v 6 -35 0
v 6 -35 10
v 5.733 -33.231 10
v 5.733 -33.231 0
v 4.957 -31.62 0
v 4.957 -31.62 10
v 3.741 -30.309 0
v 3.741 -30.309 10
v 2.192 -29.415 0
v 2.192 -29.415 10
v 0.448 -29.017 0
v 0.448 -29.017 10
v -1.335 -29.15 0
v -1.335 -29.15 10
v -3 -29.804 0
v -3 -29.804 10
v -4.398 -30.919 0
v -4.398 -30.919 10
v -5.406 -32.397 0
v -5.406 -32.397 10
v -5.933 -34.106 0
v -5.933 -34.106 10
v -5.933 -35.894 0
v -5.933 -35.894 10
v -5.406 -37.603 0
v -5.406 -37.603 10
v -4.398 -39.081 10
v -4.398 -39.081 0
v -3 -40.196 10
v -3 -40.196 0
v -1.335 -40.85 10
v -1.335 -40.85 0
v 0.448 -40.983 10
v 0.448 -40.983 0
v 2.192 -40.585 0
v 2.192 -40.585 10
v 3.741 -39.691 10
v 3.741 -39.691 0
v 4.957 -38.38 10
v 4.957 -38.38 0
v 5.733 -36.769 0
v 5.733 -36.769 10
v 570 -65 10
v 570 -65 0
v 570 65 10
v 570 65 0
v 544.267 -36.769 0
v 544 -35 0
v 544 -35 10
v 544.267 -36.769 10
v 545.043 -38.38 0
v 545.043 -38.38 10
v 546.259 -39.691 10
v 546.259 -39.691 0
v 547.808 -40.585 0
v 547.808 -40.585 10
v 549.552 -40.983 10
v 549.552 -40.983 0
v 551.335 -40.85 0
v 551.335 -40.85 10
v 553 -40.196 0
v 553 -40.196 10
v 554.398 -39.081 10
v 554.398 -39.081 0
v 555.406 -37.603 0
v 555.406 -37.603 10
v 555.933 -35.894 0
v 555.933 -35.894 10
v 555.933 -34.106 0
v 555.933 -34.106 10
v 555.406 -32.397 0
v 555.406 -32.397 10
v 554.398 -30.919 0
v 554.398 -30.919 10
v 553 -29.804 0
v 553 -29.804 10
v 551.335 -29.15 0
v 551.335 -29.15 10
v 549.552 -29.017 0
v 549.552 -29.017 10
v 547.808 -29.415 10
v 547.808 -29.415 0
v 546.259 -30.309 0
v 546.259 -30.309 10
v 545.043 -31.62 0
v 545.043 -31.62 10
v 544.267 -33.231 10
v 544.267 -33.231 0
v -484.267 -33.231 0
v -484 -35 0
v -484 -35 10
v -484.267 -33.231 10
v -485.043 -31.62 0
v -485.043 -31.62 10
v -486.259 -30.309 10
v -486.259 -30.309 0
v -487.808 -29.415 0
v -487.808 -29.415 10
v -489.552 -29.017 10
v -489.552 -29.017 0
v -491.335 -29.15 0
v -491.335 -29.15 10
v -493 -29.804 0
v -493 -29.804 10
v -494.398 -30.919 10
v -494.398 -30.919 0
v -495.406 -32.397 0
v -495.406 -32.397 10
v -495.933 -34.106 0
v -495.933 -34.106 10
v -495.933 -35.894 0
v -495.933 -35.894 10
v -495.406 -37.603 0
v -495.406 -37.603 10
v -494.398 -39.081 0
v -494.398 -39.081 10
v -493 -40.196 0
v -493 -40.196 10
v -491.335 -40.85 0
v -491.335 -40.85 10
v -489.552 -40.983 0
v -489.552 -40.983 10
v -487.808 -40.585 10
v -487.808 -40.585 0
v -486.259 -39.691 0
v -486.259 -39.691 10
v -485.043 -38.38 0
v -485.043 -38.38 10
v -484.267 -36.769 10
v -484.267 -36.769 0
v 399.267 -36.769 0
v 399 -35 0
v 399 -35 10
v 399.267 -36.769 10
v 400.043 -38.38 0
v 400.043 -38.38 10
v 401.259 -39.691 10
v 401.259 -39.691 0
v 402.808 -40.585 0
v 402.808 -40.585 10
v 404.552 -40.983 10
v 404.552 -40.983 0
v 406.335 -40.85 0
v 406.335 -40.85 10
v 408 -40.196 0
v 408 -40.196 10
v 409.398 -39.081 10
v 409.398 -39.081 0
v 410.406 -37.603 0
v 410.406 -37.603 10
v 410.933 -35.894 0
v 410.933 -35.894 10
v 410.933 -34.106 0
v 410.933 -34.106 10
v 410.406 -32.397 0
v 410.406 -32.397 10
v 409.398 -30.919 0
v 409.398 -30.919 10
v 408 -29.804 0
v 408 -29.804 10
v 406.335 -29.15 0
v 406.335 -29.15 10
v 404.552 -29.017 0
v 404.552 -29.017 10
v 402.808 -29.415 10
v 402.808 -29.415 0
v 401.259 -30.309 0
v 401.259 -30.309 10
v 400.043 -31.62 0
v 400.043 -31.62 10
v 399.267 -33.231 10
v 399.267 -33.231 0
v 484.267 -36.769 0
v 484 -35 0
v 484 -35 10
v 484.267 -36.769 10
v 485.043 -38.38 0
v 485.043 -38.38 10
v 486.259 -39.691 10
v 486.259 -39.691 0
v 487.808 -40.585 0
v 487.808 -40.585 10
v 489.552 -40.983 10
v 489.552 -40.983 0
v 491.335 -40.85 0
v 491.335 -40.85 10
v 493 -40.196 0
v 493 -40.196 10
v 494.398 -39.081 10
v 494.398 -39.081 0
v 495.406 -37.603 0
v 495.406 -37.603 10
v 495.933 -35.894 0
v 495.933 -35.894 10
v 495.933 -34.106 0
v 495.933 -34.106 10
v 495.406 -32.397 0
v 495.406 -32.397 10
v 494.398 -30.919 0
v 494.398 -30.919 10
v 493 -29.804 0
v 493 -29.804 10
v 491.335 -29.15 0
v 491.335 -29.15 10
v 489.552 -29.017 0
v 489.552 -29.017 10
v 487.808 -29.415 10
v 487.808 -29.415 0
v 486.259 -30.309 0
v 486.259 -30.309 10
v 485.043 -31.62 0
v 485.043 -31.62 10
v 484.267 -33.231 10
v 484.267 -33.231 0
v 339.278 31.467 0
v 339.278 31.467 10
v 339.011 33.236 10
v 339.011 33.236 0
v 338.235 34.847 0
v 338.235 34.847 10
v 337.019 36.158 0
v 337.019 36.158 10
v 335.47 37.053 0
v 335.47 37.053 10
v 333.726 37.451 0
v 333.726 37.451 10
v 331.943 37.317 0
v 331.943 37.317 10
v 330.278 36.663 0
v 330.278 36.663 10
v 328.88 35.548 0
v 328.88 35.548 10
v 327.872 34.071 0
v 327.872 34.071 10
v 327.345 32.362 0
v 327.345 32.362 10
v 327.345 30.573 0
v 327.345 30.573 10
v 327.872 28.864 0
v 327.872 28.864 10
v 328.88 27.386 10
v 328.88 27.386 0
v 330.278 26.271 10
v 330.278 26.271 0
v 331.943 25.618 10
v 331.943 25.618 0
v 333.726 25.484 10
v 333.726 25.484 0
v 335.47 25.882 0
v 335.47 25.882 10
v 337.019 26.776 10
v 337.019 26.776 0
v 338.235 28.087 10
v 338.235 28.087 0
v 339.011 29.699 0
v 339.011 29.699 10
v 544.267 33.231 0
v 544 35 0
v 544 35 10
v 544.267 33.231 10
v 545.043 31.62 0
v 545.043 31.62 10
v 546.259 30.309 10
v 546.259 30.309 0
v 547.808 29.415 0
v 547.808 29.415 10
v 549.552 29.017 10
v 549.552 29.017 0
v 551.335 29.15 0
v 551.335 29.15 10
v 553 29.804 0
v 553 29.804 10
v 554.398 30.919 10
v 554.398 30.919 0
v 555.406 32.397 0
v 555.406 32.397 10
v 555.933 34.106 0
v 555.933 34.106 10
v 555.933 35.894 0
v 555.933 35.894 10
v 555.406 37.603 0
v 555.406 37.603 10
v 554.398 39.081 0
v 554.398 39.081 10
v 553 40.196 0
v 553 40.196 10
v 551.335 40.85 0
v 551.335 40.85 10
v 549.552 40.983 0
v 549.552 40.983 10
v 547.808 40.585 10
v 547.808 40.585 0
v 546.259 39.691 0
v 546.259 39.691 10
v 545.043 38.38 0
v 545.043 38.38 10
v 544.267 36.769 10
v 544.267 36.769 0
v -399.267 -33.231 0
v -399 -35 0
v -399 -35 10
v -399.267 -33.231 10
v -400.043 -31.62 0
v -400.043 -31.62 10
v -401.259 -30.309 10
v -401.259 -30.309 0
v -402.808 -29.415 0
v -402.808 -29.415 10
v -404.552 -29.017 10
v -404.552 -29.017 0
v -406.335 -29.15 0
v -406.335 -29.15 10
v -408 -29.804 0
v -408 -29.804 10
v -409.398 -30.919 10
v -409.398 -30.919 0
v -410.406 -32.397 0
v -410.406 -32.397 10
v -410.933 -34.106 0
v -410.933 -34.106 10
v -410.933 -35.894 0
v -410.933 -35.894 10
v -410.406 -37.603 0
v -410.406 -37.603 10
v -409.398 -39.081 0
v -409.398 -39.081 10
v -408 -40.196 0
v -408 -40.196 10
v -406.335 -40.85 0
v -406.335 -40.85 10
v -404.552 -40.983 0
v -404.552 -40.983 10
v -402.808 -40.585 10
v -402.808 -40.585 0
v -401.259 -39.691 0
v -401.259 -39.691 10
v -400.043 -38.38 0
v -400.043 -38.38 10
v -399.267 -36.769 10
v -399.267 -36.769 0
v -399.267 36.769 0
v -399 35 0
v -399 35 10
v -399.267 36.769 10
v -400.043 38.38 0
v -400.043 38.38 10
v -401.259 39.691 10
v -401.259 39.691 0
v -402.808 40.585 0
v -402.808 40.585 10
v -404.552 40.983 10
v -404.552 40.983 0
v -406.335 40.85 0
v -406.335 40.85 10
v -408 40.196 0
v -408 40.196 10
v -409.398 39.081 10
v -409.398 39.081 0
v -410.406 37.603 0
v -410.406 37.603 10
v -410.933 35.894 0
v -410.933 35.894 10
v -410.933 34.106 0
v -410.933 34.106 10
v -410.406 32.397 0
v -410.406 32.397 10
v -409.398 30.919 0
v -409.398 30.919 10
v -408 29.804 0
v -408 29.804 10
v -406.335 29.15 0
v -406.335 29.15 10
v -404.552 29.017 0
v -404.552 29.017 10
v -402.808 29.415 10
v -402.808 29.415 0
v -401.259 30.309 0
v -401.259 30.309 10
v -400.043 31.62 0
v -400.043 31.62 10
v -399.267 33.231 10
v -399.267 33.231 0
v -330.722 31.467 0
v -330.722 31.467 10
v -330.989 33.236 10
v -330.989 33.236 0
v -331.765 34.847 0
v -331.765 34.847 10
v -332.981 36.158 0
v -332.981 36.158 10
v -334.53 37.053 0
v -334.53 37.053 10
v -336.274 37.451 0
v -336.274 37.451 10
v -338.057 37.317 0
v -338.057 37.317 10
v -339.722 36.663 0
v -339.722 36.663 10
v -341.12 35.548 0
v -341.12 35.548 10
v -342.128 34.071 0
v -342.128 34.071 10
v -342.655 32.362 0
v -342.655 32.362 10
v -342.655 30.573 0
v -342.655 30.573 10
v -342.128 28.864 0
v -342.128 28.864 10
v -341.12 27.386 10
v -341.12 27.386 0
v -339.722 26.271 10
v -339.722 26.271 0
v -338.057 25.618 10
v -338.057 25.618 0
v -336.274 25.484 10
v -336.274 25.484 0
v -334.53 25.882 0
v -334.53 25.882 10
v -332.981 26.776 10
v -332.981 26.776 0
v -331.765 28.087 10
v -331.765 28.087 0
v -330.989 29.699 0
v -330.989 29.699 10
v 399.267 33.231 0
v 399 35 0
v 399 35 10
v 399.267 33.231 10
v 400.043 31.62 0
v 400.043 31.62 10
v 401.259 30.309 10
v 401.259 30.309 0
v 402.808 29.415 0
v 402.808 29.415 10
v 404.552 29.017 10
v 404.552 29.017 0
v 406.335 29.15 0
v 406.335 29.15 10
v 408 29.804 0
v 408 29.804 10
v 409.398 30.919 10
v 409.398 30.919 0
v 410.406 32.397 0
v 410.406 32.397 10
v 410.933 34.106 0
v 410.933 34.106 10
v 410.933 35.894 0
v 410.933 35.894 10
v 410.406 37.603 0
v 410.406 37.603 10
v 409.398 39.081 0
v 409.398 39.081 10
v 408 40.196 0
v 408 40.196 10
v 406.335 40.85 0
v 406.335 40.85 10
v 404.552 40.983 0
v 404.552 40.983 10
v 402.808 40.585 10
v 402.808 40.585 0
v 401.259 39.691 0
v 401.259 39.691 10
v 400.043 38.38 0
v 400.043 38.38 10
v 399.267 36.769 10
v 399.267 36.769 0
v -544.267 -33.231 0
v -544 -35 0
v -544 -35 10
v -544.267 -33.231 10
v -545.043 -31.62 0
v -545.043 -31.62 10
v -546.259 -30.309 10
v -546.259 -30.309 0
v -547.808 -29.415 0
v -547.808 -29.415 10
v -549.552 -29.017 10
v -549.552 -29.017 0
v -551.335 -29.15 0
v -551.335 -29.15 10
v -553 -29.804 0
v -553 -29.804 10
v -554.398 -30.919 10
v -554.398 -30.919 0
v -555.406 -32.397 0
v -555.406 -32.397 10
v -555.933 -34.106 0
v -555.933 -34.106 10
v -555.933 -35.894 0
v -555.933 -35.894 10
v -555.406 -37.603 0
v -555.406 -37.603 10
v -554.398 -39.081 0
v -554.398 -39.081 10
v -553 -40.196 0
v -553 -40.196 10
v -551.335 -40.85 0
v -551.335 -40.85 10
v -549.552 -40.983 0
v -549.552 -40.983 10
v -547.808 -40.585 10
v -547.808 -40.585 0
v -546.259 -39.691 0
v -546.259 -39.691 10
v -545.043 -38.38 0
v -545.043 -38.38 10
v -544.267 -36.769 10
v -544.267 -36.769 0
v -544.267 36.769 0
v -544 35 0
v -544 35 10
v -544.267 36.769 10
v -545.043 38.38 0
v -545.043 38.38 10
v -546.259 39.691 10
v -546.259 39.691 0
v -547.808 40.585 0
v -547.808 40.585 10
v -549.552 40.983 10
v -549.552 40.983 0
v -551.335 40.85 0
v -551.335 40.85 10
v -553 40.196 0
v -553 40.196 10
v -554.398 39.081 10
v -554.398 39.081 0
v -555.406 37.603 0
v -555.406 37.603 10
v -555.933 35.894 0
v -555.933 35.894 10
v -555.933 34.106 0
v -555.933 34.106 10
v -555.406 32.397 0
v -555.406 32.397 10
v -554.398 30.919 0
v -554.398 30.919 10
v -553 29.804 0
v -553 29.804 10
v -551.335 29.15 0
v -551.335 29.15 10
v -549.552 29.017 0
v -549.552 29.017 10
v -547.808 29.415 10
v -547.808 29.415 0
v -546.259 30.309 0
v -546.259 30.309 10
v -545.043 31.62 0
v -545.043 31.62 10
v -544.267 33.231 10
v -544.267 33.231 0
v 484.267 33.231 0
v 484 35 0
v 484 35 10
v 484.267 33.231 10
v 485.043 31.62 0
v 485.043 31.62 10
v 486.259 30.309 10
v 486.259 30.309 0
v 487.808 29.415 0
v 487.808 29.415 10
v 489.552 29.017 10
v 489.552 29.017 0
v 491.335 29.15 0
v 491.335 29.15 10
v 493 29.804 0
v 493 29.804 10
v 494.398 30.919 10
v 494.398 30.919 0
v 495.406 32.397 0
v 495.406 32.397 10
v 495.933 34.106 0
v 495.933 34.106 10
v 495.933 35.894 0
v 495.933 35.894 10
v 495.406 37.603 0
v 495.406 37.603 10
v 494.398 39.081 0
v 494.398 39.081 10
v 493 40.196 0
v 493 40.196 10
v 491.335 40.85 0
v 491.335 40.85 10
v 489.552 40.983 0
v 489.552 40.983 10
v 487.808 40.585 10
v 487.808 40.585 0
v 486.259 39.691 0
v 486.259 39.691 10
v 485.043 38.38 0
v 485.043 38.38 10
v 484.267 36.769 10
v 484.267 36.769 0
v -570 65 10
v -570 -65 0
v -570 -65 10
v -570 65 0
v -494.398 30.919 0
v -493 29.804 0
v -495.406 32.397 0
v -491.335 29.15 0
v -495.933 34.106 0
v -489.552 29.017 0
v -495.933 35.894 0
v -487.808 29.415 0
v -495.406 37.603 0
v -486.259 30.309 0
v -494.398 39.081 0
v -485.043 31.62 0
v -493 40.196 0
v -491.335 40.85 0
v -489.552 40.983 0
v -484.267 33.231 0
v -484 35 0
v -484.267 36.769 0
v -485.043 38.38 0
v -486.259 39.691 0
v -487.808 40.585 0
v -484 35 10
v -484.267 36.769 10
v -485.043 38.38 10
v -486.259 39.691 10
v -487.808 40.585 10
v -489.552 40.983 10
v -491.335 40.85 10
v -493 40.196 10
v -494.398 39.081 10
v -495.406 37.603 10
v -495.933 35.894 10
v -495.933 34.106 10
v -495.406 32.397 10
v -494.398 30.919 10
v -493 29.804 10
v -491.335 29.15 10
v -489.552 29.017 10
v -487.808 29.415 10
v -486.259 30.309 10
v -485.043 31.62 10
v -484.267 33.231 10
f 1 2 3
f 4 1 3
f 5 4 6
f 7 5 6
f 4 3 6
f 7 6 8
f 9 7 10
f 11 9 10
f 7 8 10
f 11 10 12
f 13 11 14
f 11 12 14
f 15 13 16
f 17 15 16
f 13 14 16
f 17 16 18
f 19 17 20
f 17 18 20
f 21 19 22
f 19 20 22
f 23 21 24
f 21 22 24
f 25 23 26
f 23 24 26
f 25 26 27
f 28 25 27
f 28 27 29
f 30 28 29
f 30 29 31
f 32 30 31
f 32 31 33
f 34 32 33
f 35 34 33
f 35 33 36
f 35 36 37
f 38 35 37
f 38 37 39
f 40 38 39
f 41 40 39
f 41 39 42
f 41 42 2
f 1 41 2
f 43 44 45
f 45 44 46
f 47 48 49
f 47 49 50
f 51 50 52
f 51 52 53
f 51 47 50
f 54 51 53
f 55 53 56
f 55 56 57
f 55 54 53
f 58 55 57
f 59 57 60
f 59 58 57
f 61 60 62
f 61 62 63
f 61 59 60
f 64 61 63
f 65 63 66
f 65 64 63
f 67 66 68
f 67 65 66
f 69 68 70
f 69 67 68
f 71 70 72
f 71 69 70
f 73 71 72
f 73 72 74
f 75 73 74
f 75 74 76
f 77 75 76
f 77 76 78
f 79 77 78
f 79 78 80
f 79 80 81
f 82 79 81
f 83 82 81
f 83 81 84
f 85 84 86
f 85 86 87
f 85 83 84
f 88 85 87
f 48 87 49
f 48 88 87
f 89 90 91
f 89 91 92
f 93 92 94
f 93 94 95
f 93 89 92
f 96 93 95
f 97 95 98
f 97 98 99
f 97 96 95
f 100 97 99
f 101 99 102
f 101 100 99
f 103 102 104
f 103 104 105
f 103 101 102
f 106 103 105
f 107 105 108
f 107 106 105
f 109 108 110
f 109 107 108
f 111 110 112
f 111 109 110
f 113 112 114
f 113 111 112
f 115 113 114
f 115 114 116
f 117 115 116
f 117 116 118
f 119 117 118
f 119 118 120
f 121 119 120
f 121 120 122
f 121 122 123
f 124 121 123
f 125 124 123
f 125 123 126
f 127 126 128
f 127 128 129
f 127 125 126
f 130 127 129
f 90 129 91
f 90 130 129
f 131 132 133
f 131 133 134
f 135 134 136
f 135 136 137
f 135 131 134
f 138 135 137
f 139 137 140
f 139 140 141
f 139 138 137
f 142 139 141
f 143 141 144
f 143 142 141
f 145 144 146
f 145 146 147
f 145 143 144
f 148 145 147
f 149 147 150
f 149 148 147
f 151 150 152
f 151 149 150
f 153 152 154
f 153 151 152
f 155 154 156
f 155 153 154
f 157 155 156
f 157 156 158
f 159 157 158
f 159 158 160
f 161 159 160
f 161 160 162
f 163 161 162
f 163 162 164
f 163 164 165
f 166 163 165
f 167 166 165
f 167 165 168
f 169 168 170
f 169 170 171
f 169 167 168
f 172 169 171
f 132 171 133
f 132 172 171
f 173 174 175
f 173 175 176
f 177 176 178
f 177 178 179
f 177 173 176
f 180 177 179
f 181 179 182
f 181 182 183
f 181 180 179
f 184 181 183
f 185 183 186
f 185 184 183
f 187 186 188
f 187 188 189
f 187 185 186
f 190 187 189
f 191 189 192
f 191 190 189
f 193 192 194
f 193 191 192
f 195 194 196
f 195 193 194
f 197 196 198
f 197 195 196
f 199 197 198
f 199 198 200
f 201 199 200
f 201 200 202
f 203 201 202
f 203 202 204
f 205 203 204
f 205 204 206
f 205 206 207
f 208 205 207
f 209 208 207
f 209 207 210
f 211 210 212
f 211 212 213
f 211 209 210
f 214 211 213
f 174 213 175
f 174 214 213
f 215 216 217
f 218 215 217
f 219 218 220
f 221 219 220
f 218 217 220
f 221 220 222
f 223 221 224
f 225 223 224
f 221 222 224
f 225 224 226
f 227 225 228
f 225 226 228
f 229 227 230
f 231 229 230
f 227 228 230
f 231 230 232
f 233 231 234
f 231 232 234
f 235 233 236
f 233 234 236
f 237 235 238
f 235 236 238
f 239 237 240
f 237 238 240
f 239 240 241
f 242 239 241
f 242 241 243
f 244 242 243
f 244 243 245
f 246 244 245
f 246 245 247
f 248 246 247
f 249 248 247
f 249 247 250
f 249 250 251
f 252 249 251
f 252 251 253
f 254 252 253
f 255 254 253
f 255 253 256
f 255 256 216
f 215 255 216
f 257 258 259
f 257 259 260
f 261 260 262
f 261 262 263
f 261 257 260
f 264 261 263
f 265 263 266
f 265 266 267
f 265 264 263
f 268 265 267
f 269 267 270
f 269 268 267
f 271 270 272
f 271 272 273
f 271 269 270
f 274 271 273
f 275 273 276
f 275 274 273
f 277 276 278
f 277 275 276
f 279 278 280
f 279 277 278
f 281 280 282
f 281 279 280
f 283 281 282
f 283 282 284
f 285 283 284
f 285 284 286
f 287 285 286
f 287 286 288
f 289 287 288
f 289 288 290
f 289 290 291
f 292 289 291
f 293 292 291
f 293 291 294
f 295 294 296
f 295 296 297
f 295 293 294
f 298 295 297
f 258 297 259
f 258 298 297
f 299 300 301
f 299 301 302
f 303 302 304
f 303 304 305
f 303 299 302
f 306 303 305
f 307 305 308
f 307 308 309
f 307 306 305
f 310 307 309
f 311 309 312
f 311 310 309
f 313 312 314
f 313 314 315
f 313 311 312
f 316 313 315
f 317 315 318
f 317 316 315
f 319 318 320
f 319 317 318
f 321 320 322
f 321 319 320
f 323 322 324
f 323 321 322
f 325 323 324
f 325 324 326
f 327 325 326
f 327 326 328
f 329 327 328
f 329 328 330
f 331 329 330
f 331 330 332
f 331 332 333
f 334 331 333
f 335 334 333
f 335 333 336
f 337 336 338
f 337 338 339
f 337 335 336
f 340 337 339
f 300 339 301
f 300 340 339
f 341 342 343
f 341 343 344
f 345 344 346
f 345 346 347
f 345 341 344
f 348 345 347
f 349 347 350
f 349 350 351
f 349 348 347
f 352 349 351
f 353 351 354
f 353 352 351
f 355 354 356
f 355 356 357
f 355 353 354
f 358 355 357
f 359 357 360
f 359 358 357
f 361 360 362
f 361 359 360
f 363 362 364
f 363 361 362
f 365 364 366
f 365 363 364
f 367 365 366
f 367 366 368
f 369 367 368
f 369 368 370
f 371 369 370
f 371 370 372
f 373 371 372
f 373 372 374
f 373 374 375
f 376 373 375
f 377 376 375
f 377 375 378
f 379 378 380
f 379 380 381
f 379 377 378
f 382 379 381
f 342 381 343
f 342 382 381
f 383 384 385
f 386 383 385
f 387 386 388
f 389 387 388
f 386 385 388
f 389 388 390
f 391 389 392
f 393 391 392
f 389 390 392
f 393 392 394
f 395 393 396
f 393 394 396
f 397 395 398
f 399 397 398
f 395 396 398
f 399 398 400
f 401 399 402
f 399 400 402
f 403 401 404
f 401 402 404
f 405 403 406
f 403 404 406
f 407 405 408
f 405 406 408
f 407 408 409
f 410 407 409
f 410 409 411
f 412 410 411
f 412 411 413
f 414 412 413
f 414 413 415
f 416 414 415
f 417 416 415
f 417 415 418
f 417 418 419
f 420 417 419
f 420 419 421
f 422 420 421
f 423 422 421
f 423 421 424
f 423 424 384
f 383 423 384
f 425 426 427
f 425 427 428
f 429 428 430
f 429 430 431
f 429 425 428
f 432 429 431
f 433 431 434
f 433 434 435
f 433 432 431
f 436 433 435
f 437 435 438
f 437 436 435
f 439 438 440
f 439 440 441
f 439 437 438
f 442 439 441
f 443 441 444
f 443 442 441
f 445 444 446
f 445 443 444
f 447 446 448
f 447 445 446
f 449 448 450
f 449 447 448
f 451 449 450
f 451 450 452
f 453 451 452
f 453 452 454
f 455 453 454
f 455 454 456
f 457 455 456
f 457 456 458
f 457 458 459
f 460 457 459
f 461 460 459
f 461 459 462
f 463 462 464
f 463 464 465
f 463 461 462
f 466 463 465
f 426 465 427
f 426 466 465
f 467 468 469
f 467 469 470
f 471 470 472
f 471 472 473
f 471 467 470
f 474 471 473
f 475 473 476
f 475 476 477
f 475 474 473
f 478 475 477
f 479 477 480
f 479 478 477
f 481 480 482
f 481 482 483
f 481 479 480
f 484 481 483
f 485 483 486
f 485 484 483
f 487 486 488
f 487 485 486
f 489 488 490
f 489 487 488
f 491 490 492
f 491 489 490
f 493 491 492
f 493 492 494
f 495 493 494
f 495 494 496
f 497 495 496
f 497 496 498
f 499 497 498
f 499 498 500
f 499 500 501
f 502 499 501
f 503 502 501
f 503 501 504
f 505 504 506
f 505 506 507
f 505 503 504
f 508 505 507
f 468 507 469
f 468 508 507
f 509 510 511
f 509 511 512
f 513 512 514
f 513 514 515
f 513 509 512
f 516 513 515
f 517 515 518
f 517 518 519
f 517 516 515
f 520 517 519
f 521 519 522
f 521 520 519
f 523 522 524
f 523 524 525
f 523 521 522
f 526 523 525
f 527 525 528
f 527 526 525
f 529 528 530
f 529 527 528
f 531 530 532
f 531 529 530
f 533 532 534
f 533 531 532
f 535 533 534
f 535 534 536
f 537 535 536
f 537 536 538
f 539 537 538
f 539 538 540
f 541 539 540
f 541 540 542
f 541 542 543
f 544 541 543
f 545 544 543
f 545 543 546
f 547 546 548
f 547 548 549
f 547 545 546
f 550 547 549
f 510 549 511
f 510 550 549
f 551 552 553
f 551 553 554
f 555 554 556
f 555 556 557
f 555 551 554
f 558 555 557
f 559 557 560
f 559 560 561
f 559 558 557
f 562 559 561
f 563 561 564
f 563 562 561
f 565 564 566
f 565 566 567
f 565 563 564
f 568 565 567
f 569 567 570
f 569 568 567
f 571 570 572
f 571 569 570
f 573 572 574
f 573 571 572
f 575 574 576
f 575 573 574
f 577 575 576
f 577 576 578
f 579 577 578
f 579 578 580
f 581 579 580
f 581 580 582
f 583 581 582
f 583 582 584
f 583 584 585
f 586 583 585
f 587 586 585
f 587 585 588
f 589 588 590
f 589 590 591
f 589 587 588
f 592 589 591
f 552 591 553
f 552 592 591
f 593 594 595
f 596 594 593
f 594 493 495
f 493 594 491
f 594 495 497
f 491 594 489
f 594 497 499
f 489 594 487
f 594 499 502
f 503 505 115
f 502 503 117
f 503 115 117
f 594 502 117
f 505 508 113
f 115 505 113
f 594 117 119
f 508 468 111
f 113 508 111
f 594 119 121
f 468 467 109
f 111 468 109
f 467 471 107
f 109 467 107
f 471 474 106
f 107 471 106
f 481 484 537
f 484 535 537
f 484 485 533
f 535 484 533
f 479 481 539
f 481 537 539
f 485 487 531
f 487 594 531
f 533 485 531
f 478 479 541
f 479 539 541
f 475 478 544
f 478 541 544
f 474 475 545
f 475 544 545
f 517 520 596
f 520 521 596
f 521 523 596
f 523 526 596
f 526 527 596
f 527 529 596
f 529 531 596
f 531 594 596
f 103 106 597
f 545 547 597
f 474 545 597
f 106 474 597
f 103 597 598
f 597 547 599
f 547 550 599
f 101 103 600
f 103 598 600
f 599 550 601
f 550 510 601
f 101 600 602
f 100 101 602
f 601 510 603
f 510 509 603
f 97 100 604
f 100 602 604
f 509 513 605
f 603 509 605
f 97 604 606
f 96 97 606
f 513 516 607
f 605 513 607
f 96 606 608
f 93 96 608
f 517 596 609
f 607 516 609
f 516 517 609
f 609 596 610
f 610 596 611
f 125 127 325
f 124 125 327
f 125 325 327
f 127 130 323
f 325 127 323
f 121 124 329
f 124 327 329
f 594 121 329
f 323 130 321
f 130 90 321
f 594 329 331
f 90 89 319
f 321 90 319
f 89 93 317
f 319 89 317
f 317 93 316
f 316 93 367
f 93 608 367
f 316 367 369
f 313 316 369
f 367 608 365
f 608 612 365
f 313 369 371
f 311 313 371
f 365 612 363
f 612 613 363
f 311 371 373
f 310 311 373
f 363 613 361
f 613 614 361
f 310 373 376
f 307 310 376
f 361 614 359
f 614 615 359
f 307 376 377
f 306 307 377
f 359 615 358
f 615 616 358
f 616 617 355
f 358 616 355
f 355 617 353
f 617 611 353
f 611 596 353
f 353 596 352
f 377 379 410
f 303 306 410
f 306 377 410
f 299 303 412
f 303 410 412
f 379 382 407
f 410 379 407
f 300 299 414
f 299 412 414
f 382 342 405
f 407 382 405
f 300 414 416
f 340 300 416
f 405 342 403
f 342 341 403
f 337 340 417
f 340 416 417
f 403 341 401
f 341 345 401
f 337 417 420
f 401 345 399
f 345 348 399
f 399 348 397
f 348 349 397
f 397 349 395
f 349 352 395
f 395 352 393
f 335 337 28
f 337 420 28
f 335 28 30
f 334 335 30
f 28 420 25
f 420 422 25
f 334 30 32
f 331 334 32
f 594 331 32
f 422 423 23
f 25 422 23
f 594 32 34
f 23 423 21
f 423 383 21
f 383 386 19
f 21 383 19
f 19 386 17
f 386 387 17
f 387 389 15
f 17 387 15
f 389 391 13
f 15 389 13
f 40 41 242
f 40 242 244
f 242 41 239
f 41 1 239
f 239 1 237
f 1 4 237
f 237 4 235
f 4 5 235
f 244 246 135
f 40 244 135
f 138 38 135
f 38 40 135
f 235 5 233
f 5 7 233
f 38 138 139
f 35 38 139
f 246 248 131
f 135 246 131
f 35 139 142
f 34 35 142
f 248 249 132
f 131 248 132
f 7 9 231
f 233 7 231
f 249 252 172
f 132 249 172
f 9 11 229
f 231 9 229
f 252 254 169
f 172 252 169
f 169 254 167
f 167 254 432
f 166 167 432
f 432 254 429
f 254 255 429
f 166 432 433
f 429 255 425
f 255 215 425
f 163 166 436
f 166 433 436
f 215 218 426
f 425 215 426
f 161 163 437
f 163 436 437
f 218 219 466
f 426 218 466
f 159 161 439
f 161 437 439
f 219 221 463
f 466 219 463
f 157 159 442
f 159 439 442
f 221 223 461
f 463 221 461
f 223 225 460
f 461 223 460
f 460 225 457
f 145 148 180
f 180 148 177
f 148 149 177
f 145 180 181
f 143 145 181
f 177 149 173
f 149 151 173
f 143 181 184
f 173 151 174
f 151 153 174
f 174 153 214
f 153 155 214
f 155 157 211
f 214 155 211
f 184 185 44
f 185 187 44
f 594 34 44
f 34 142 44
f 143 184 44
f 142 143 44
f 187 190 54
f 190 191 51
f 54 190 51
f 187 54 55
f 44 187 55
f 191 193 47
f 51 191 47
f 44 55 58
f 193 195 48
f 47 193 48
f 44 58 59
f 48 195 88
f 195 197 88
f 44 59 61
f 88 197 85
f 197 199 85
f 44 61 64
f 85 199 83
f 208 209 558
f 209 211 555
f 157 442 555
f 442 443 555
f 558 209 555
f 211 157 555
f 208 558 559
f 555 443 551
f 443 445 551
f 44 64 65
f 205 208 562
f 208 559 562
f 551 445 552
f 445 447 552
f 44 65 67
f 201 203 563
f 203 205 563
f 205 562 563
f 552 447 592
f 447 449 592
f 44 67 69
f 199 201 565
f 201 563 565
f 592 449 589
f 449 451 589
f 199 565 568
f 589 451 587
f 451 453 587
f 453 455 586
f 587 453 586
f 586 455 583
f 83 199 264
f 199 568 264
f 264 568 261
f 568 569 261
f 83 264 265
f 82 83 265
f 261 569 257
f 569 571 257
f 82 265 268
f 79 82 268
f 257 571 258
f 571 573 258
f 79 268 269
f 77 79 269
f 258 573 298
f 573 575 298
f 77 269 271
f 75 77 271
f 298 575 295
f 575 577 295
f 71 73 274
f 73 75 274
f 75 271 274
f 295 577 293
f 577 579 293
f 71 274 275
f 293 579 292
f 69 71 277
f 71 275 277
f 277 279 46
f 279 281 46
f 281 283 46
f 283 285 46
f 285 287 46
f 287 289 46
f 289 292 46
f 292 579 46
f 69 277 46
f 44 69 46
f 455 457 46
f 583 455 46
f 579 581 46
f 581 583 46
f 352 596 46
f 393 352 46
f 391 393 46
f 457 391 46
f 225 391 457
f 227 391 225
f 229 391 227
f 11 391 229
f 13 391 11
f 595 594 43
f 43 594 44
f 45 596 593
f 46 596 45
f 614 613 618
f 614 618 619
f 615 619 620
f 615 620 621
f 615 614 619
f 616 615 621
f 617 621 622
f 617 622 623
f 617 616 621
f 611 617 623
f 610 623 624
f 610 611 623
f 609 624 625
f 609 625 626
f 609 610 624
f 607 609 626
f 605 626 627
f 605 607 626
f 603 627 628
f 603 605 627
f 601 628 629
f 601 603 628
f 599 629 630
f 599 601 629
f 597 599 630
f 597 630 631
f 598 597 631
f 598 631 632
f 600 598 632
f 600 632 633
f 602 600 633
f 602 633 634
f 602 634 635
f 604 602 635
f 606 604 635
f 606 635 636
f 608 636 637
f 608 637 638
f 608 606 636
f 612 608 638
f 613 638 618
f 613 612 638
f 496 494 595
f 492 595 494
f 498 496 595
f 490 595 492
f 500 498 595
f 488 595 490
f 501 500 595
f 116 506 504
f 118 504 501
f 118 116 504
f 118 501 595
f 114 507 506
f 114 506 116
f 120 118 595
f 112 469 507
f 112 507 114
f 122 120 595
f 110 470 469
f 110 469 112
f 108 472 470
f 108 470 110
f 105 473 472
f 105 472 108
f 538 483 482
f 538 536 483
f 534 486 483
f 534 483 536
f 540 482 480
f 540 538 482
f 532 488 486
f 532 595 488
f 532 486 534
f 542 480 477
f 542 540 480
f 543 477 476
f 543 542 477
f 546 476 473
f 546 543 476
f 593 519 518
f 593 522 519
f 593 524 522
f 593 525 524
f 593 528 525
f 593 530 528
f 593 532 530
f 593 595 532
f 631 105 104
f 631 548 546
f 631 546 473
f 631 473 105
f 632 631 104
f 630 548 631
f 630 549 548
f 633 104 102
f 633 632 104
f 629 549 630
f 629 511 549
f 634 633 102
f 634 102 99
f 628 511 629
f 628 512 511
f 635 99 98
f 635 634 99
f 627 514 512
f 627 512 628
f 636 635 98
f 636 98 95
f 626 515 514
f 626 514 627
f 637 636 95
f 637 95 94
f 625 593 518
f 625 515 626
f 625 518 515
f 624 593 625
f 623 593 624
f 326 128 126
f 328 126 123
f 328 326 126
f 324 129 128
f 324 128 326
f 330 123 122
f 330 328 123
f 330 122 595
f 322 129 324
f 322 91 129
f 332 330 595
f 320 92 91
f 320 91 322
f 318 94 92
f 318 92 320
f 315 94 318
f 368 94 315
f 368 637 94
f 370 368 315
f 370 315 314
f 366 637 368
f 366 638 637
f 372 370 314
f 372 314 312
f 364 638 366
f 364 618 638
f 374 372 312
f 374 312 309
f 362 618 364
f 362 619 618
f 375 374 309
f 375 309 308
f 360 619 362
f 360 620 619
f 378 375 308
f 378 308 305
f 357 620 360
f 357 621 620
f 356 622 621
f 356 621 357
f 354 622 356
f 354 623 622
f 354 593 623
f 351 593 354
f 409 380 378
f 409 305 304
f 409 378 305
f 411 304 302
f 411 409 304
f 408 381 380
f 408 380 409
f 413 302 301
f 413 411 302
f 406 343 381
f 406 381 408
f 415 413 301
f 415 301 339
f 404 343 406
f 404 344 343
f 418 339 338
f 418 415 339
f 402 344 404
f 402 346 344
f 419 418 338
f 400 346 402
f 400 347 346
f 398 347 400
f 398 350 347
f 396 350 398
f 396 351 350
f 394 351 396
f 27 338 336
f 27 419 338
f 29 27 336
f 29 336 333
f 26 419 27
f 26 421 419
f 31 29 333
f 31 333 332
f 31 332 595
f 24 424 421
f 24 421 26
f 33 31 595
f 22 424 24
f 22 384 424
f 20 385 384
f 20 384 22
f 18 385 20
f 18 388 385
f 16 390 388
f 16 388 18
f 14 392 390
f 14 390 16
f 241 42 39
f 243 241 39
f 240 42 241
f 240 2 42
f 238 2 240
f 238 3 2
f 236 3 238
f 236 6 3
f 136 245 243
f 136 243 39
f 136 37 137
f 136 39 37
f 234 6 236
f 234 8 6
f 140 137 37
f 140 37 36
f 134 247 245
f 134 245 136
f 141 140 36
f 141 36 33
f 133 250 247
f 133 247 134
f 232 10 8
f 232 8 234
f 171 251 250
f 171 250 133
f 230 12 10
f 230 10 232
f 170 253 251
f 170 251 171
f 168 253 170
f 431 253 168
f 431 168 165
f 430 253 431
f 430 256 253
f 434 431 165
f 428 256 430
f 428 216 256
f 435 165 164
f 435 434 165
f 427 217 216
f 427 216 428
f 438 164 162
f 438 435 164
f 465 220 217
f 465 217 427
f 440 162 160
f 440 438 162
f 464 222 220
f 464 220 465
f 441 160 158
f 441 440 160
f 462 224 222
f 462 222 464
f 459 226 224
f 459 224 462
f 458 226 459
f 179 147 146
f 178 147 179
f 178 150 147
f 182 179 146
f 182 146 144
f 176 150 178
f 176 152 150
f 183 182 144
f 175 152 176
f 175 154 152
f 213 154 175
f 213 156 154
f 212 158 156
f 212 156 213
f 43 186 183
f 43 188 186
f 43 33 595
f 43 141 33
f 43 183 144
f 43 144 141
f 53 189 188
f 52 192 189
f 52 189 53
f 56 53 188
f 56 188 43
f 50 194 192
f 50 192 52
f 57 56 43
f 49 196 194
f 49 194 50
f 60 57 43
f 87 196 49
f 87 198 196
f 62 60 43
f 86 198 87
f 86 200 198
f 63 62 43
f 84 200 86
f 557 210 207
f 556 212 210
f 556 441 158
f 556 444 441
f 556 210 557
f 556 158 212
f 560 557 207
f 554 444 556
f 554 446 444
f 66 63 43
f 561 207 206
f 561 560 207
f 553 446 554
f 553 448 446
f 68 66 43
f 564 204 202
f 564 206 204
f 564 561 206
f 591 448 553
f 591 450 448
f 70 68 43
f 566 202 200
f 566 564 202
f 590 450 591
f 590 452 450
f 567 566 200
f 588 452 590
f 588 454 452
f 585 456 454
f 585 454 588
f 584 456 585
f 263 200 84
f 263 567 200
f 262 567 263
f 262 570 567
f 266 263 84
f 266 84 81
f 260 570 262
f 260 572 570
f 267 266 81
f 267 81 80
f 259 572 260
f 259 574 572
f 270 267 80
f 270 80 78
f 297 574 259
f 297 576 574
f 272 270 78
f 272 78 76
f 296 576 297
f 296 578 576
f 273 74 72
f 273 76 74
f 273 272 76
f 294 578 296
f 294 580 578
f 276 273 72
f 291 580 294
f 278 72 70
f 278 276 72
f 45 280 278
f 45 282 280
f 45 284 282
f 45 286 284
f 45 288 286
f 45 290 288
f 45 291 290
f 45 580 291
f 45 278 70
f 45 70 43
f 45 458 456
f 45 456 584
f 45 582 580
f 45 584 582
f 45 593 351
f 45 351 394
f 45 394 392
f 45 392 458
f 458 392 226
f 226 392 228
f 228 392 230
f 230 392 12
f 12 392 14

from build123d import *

# Parameters (mm, degrees)
SKETCH_1_W          = 1140
SKETCH_1_H          = 130
SKETCH_1_R          = 6
EXTRUDE_1_DEPTH     = 10
SKETCH_2_R          = 6
CUT_EXTRUDE_1_DEPTH = 574.781317228
SKETCH_3_R          = 6
CUT_EXTRUDE_2_DEPTH = 574.781317228
SKETCH_4_R          = 6
CUT_EXTRUDE_3_DEPTH = 574.781317228


with BuildPart() as part:
    # 草图1 → 凸台-拉伸1 (new body)
    with BuildSketch(Plane.XY):
        Rectangle(SKETCH_1_W, SKETCH_1_H)
        with Locations((-550, 35)):
            Circle(SKETCH_1_R, mode=Mode.SUBTRACT)
        with Locations((-490, 35)):
            Circle(SKETCH_1_R, mode=Mode.SUBTRACT)
        with Locations((-405, 35)):
            Circle(SKETCH_1_R, mode=Mode.SUBTRACT)
        with Locations((-550, -35)):
            Circle(SKETCH_1_R, mode=Mode.SUBTRACT)
        with Locations((-490, -35)):
            Circle(SKETCH_1_R, mode=Mode.SUBTRACT)
        with Locations((-405, -35)):
            Circle(SKETCH_1_R, mode=Mode.SUBTRACT)
        with Locations(Location((405, -35, 0), (0, 0, 180))):
            Circle(SKETCH_1_R, mode=Mode.SUBTRACT)
        with Locations(Location((490, -35, 0), (0, 0, 180))):
            Circle(SKETCH_1_R, mode=Mode.SUBTRACT)
        with Locations(Location((550, -35, 0), (0, 0, 180))):
            Circle(SKETCH_1_R, mode=Mode.SUBTRACT)
        with Locations(Location((405, 35, 0), (0, 0, 180))):
            Circle(SKETCH_1_R, mode=Mode.SUBTRACT)
        with Locations(Location((490, 35, 0), (0, 0, 180))):
            Circle(SKETCH_1_R, mode=Mode.SUBTRACT)
        with Locations(Location((550, 35, 0), (0, 0, 180))):
            Circle(SKETCH_1_R, mode=Mode.SUBTRACT)
    extrude(amount=EXTRUDE_1_DEPTH)

    # 草图2 → 切除-拉伸1 (cut, through all)
    with BuildSketch(Plane.XY.offset(10)):
        with Locations((0, -35)):
            Circle(SKETCH_2_R)
    extrude(amount=-CUT_EXTRUDE_1_DEPTH, mode=Mode.SUBTRACT)

    # 草图3 → 切除-拉伸2 (cut, through all)
    with BuildSketch(Plane.XY.offset(10)):
        with Locations((333.277993355, 31.467302422)):
            Circle(SKETCH_3_R)
    extrude(amount=-CUT_EXTRUDE_2_DEPTH, mode=Mode.SUBTRACT)

    # 草图4 → 切除-拉伸3 (cut, through all)
    with BuildSketch(Plane.XY.offset(10)):
        with Locations((-336.722006645, 31.467302422)):
            Circle(SKETCH_4_R)
    extrude(amount=-CUT_EXTRUDE_3_DEPTH, mode=Mode.SUBTRACT)


solid = part.part
